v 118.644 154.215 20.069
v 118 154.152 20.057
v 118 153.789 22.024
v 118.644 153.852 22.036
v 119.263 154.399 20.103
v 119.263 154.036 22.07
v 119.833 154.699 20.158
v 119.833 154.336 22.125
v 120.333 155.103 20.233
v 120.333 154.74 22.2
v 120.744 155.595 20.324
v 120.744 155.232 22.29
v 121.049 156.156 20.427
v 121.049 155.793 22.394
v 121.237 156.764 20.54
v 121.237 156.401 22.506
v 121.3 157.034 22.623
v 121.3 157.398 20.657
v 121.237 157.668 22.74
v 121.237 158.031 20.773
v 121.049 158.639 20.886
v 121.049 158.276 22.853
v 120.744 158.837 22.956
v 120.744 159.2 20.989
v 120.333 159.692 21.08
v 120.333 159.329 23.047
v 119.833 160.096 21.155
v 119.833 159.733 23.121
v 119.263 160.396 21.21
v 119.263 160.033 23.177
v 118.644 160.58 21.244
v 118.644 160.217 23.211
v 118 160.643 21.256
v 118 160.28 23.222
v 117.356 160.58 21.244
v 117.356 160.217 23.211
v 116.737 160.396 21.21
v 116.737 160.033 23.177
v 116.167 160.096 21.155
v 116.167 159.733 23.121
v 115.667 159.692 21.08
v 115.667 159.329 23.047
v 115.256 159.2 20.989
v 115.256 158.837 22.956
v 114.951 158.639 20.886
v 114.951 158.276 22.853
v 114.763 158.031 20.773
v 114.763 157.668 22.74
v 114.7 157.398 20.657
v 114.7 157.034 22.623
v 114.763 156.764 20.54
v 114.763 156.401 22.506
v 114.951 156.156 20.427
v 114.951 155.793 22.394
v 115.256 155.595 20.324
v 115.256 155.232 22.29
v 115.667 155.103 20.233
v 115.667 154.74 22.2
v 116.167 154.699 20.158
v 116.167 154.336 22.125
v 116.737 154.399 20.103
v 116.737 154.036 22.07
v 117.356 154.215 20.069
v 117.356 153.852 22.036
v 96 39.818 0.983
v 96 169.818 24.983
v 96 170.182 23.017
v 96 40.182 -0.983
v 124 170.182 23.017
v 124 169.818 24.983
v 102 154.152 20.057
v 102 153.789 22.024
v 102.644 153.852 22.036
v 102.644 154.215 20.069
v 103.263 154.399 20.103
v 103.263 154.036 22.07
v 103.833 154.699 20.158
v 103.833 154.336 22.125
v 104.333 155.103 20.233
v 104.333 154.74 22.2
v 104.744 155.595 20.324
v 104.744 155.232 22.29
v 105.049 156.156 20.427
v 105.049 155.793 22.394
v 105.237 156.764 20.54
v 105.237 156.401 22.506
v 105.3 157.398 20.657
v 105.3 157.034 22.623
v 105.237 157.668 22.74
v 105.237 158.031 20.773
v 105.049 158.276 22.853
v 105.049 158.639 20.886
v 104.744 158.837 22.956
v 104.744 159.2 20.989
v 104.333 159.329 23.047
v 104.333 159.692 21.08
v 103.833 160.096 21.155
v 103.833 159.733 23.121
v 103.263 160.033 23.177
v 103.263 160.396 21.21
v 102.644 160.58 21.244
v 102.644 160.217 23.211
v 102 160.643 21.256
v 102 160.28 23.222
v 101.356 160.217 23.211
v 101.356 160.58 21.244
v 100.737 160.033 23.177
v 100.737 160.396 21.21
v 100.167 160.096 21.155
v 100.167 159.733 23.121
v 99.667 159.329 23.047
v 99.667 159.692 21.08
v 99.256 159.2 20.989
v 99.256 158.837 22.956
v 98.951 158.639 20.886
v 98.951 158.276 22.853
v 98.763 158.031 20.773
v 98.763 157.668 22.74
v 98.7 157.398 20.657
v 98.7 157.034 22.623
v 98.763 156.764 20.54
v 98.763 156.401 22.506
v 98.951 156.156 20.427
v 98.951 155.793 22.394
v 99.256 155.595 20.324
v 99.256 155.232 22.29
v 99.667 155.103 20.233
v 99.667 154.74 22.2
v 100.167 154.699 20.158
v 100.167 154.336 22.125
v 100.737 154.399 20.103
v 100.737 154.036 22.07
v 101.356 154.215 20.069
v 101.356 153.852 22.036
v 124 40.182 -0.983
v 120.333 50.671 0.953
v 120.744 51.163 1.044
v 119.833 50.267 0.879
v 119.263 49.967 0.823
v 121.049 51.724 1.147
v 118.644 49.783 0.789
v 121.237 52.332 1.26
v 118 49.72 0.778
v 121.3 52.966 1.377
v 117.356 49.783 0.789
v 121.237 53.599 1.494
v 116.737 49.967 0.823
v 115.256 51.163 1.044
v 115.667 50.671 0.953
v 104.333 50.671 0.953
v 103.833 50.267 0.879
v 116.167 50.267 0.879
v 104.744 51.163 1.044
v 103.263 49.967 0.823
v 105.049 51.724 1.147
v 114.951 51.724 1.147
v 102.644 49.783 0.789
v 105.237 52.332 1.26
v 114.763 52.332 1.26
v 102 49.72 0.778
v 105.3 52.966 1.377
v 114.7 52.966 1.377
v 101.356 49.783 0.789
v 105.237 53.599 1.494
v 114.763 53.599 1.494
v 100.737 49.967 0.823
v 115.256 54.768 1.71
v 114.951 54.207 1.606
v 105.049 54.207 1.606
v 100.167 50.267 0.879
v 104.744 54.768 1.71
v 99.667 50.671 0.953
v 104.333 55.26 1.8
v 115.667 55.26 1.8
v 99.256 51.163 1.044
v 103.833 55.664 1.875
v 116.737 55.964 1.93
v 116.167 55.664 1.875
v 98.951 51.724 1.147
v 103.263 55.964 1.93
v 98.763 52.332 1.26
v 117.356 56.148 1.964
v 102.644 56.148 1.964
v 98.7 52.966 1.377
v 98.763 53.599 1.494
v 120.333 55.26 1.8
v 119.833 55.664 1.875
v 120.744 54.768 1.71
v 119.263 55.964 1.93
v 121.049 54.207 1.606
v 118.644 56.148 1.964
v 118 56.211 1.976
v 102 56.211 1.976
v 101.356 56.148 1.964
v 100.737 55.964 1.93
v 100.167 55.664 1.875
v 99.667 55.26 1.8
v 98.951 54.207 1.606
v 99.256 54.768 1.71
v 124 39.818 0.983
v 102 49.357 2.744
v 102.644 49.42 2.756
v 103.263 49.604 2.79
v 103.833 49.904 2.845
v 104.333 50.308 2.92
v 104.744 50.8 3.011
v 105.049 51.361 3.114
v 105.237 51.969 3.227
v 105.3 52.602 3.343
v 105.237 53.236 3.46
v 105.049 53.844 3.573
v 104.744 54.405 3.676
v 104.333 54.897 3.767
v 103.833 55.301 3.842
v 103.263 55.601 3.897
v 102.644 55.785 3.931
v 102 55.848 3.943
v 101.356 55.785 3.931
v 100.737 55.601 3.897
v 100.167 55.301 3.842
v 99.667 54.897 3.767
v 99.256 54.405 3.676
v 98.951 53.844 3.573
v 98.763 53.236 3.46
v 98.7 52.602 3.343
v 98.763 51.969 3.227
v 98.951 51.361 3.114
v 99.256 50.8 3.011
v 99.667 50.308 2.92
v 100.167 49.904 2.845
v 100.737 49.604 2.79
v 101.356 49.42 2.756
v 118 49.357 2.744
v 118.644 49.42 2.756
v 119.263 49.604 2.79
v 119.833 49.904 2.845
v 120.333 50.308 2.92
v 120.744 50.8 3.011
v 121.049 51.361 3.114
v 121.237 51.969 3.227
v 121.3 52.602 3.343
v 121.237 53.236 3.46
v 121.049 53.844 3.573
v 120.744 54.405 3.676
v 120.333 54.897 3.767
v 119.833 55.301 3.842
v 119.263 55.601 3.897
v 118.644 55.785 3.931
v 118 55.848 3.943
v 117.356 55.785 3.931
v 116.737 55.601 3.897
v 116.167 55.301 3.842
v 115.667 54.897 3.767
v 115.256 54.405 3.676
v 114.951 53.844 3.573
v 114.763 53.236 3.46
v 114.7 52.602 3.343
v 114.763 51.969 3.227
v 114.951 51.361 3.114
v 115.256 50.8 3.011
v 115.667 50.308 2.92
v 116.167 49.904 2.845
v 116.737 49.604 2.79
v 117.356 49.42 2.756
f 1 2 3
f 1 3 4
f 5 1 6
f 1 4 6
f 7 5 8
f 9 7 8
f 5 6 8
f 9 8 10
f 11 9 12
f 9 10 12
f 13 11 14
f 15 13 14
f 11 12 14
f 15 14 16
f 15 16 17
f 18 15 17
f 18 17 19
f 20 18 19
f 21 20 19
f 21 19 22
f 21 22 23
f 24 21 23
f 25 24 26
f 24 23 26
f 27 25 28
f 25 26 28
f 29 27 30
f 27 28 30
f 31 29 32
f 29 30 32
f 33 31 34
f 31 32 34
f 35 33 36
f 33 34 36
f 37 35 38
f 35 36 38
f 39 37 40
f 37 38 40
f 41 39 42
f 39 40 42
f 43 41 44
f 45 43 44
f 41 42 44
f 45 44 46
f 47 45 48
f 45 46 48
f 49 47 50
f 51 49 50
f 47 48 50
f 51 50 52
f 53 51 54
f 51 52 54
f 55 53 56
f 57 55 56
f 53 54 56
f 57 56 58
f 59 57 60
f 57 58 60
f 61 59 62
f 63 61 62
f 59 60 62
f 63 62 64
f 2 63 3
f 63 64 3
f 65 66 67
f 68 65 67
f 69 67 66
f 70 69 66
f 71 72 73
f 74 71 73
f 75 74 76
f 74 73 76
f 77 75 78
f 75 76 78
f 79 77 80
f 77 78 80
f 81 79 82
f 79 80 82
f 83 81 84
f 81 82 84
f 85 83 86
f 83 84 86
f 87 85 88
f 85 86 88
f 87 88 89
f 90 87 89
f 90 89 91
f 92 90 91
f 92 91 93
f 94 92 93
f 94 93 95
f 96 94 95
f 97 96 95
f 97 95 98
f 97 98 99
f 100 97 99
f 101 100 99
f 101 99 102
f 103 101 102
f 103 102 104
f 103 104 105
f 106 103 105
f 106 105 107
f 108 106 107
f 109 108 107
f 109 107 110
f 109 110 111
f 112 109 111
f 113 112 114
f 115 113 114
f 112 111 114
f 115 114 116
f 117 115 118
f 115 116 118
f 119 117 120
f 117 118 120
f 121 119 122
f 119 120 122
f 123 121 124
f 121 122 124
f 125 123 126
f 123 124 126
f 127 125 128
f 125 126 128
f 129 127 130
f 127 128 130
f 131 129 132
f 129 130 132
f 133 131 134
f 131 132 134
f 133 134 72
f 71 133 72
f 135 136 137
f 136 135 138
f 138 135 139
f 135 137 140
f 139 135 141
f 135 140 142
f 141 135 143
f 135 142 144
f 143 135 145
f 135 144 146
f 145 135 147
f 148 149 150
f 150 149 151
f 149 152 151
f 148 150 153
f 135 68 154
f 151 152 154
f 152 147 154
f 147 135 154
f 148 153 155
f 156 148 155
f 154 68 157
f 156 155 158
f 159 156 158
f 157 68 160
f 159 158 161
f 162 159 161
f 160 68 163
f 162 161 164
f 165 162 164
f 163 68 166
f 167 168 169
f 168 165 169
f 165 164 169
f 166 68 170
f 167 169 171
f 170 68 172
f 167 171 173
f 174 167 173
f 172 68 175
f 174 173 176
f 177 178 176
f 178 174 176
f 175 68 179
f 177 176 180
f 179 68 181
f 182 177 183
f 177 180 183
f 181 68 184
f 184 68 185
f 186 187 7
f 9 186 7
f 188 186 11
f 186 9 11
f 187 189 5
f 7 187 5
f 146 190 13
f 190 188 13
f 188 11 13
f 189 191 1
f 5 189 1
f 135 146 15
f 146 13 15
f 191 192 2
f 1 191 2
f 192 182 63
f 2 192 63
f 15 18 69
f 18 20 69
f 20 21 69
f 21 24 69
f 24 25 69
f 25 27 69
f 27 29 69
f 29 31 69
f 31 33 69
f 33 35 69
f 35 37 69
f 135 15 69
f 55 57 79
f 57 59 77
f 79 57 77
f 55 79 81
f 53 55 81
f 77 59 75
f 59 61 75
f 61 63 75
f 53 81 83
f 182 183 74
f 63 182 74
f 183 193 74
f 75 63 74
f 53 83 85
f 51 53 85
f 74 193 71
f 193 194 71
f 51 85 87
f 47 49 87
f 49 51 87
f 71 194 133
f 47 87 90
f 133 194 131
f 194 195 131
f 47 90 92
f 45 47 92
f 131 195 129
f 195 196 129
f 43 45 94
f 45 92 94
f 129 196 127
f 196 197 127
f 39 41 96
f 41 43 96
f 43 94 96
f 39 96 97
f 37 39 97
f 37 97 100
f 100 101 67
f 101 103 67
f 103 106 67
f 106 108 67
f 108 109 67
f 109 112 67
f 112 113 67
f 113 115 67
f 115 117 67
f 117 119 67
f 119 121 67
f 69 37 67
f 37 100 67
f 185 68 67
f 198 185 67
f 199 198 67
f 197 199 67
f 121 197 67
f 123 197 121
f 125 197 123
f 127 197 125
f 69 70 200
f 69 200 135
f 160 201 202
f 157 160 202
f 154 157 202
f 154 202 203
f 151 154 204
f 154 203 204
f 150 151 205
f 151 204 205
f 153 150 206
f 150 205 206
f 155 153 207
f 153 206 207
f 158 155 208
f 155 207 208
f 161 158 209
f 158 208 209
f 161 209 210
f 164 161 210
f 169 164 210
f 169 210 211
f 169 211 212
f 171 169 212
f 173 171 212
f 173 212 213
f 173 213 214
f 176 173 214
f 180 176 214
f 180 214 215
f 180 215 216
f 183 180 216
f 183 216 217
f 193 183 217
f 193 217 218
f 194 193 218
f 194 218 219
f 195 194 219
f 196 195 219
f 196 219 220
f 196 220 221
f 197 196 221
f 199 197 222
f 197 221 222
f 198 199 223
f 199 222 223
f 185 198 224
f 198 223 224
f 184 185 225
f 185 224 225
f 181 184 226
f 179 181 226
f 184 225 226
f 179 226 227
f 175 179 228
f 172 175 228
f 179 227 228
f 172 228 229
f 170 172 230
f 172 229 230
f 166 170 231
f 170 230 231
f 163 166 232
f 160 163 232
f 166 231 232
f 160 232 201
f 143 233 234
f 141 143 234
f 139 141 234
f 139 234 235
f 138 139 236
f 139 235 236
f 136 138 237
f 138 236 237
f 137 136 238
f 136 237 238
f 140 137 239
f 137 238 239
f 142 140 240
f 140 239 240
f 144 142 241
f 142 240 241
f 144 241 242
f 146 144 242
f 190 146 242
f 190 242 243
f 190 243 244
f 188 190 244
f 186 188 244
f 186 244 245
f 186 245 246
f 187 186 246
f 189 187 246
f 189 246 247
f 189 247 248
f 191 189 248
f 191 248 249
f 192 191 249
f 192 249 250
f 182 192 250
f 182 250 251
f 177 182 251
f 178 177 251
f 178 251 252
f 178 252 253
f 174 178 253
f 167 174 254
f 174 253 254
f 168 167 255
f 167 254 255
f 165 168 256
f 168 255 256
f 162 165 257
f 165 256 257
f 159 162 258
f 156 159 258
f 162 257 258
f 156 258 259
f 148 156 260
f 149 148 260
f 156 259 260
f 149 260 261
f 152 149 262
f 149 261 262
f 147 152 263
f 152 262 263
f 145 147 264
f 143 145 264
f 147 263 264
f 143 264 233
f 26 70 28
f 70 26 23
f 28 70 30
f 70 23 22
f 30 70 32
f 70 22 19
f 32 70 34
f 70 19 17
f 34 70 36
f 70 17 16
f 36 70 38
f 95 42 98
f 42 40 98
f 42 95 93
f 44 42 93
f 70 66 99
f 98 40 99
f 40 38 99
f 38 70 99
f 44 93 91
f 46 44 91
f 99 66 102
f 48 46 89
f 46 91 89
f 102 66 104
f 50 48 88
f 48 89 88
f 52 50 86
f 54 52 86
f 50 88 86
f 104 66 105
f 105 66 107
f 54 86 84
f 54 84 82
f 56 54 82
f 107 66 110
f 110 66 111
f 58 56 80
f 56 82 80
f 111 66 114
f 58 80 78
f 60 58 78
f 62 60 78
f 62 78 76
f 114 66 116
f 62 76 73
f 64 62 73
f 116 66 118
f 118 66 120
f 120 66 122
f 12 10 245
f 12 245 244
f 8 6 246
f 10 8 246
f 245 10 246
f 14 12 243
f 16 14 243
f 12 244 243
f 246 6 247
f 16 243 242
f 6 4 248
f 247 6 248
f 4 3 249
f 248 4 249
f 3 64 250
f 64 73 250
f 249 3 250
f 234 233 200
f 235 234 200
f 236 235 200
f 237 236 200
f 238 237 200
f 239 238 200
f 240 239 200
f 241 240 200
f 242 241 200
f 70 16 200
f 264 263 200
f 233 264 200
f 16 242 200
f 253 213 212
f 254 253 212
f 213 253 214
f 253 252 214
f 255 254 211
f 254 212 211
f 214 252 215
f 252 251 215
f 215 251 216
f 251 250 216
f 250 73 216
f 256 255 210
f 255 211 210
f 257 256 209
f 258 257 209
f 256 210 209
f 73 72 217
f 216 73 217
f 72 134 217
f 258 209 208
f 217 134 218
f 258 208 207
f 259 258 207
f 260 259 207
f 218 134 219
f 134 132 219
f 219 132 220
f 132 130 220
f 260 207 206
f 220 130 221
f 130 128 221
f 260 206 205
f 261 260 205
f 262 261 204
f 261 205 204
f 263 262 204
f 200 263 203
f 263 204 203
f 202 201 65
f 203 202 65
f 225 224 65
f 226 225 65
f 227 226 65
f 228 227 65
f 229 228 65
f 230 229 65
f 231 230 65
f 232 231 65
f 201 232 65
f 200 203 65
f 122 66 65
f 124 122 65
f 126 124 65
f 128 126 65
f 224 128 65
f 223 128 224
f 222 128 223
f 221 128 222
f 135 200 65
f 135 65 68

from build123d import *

# Parameters (mm, degrees)
LEAF_START           = 96
LEAF_DEPTH           = 28
SKETCH_2_R           = 3.3
MOUNTING_HOLES_DEPTH = 4


with BuildPart() as part:
    # 草图1 → Leaf (new body)
    with BuildSketch(Plane(origin=(0, 0, 0), x_dir=(0, 0, -1), z_dir=(1, 0, 0)).offset(LEAF_START)):
        Polygon((0.98338218, 40.181547479), (-23.01661782, 170.181547479), (-24.98338218, 169.818452521), (-0.98338218, 39.818452521), align=None)
    extrude(amount=LEAF_DEPTH)

    # 草图2 → Mounting Holes (cut, symmetric)
    with BuildSketch(Plane(origin=(0, 1.136832012, -6.157840067), x_dir=(1, 0, 0), z_dir=(0, -0.18154747945610336, 0.9833821803872266))):
        with Locations(Location((102, 52.335287215, 0), (0, 0, 270))):
            Circle(SKETCH_2_R)
        with Locations(Location((118, 52.335287215, 0), (0, 0, 270))):
            Circle(SKETCH_2_R)
        with Locations(Location((102, 158.532110173, 0), (0, 0, 270))):
            Circle(SKETCH_2_R)
        with Locations(Location((118, 158.532110173, 0), (0, 0, 270))):
            Circle(SKETCH_2_R)
    extrude(amount=MOUNTING_HOLES_DEPTH, both=True, mode=Mode.SUBTRACT)


solid = part.part
